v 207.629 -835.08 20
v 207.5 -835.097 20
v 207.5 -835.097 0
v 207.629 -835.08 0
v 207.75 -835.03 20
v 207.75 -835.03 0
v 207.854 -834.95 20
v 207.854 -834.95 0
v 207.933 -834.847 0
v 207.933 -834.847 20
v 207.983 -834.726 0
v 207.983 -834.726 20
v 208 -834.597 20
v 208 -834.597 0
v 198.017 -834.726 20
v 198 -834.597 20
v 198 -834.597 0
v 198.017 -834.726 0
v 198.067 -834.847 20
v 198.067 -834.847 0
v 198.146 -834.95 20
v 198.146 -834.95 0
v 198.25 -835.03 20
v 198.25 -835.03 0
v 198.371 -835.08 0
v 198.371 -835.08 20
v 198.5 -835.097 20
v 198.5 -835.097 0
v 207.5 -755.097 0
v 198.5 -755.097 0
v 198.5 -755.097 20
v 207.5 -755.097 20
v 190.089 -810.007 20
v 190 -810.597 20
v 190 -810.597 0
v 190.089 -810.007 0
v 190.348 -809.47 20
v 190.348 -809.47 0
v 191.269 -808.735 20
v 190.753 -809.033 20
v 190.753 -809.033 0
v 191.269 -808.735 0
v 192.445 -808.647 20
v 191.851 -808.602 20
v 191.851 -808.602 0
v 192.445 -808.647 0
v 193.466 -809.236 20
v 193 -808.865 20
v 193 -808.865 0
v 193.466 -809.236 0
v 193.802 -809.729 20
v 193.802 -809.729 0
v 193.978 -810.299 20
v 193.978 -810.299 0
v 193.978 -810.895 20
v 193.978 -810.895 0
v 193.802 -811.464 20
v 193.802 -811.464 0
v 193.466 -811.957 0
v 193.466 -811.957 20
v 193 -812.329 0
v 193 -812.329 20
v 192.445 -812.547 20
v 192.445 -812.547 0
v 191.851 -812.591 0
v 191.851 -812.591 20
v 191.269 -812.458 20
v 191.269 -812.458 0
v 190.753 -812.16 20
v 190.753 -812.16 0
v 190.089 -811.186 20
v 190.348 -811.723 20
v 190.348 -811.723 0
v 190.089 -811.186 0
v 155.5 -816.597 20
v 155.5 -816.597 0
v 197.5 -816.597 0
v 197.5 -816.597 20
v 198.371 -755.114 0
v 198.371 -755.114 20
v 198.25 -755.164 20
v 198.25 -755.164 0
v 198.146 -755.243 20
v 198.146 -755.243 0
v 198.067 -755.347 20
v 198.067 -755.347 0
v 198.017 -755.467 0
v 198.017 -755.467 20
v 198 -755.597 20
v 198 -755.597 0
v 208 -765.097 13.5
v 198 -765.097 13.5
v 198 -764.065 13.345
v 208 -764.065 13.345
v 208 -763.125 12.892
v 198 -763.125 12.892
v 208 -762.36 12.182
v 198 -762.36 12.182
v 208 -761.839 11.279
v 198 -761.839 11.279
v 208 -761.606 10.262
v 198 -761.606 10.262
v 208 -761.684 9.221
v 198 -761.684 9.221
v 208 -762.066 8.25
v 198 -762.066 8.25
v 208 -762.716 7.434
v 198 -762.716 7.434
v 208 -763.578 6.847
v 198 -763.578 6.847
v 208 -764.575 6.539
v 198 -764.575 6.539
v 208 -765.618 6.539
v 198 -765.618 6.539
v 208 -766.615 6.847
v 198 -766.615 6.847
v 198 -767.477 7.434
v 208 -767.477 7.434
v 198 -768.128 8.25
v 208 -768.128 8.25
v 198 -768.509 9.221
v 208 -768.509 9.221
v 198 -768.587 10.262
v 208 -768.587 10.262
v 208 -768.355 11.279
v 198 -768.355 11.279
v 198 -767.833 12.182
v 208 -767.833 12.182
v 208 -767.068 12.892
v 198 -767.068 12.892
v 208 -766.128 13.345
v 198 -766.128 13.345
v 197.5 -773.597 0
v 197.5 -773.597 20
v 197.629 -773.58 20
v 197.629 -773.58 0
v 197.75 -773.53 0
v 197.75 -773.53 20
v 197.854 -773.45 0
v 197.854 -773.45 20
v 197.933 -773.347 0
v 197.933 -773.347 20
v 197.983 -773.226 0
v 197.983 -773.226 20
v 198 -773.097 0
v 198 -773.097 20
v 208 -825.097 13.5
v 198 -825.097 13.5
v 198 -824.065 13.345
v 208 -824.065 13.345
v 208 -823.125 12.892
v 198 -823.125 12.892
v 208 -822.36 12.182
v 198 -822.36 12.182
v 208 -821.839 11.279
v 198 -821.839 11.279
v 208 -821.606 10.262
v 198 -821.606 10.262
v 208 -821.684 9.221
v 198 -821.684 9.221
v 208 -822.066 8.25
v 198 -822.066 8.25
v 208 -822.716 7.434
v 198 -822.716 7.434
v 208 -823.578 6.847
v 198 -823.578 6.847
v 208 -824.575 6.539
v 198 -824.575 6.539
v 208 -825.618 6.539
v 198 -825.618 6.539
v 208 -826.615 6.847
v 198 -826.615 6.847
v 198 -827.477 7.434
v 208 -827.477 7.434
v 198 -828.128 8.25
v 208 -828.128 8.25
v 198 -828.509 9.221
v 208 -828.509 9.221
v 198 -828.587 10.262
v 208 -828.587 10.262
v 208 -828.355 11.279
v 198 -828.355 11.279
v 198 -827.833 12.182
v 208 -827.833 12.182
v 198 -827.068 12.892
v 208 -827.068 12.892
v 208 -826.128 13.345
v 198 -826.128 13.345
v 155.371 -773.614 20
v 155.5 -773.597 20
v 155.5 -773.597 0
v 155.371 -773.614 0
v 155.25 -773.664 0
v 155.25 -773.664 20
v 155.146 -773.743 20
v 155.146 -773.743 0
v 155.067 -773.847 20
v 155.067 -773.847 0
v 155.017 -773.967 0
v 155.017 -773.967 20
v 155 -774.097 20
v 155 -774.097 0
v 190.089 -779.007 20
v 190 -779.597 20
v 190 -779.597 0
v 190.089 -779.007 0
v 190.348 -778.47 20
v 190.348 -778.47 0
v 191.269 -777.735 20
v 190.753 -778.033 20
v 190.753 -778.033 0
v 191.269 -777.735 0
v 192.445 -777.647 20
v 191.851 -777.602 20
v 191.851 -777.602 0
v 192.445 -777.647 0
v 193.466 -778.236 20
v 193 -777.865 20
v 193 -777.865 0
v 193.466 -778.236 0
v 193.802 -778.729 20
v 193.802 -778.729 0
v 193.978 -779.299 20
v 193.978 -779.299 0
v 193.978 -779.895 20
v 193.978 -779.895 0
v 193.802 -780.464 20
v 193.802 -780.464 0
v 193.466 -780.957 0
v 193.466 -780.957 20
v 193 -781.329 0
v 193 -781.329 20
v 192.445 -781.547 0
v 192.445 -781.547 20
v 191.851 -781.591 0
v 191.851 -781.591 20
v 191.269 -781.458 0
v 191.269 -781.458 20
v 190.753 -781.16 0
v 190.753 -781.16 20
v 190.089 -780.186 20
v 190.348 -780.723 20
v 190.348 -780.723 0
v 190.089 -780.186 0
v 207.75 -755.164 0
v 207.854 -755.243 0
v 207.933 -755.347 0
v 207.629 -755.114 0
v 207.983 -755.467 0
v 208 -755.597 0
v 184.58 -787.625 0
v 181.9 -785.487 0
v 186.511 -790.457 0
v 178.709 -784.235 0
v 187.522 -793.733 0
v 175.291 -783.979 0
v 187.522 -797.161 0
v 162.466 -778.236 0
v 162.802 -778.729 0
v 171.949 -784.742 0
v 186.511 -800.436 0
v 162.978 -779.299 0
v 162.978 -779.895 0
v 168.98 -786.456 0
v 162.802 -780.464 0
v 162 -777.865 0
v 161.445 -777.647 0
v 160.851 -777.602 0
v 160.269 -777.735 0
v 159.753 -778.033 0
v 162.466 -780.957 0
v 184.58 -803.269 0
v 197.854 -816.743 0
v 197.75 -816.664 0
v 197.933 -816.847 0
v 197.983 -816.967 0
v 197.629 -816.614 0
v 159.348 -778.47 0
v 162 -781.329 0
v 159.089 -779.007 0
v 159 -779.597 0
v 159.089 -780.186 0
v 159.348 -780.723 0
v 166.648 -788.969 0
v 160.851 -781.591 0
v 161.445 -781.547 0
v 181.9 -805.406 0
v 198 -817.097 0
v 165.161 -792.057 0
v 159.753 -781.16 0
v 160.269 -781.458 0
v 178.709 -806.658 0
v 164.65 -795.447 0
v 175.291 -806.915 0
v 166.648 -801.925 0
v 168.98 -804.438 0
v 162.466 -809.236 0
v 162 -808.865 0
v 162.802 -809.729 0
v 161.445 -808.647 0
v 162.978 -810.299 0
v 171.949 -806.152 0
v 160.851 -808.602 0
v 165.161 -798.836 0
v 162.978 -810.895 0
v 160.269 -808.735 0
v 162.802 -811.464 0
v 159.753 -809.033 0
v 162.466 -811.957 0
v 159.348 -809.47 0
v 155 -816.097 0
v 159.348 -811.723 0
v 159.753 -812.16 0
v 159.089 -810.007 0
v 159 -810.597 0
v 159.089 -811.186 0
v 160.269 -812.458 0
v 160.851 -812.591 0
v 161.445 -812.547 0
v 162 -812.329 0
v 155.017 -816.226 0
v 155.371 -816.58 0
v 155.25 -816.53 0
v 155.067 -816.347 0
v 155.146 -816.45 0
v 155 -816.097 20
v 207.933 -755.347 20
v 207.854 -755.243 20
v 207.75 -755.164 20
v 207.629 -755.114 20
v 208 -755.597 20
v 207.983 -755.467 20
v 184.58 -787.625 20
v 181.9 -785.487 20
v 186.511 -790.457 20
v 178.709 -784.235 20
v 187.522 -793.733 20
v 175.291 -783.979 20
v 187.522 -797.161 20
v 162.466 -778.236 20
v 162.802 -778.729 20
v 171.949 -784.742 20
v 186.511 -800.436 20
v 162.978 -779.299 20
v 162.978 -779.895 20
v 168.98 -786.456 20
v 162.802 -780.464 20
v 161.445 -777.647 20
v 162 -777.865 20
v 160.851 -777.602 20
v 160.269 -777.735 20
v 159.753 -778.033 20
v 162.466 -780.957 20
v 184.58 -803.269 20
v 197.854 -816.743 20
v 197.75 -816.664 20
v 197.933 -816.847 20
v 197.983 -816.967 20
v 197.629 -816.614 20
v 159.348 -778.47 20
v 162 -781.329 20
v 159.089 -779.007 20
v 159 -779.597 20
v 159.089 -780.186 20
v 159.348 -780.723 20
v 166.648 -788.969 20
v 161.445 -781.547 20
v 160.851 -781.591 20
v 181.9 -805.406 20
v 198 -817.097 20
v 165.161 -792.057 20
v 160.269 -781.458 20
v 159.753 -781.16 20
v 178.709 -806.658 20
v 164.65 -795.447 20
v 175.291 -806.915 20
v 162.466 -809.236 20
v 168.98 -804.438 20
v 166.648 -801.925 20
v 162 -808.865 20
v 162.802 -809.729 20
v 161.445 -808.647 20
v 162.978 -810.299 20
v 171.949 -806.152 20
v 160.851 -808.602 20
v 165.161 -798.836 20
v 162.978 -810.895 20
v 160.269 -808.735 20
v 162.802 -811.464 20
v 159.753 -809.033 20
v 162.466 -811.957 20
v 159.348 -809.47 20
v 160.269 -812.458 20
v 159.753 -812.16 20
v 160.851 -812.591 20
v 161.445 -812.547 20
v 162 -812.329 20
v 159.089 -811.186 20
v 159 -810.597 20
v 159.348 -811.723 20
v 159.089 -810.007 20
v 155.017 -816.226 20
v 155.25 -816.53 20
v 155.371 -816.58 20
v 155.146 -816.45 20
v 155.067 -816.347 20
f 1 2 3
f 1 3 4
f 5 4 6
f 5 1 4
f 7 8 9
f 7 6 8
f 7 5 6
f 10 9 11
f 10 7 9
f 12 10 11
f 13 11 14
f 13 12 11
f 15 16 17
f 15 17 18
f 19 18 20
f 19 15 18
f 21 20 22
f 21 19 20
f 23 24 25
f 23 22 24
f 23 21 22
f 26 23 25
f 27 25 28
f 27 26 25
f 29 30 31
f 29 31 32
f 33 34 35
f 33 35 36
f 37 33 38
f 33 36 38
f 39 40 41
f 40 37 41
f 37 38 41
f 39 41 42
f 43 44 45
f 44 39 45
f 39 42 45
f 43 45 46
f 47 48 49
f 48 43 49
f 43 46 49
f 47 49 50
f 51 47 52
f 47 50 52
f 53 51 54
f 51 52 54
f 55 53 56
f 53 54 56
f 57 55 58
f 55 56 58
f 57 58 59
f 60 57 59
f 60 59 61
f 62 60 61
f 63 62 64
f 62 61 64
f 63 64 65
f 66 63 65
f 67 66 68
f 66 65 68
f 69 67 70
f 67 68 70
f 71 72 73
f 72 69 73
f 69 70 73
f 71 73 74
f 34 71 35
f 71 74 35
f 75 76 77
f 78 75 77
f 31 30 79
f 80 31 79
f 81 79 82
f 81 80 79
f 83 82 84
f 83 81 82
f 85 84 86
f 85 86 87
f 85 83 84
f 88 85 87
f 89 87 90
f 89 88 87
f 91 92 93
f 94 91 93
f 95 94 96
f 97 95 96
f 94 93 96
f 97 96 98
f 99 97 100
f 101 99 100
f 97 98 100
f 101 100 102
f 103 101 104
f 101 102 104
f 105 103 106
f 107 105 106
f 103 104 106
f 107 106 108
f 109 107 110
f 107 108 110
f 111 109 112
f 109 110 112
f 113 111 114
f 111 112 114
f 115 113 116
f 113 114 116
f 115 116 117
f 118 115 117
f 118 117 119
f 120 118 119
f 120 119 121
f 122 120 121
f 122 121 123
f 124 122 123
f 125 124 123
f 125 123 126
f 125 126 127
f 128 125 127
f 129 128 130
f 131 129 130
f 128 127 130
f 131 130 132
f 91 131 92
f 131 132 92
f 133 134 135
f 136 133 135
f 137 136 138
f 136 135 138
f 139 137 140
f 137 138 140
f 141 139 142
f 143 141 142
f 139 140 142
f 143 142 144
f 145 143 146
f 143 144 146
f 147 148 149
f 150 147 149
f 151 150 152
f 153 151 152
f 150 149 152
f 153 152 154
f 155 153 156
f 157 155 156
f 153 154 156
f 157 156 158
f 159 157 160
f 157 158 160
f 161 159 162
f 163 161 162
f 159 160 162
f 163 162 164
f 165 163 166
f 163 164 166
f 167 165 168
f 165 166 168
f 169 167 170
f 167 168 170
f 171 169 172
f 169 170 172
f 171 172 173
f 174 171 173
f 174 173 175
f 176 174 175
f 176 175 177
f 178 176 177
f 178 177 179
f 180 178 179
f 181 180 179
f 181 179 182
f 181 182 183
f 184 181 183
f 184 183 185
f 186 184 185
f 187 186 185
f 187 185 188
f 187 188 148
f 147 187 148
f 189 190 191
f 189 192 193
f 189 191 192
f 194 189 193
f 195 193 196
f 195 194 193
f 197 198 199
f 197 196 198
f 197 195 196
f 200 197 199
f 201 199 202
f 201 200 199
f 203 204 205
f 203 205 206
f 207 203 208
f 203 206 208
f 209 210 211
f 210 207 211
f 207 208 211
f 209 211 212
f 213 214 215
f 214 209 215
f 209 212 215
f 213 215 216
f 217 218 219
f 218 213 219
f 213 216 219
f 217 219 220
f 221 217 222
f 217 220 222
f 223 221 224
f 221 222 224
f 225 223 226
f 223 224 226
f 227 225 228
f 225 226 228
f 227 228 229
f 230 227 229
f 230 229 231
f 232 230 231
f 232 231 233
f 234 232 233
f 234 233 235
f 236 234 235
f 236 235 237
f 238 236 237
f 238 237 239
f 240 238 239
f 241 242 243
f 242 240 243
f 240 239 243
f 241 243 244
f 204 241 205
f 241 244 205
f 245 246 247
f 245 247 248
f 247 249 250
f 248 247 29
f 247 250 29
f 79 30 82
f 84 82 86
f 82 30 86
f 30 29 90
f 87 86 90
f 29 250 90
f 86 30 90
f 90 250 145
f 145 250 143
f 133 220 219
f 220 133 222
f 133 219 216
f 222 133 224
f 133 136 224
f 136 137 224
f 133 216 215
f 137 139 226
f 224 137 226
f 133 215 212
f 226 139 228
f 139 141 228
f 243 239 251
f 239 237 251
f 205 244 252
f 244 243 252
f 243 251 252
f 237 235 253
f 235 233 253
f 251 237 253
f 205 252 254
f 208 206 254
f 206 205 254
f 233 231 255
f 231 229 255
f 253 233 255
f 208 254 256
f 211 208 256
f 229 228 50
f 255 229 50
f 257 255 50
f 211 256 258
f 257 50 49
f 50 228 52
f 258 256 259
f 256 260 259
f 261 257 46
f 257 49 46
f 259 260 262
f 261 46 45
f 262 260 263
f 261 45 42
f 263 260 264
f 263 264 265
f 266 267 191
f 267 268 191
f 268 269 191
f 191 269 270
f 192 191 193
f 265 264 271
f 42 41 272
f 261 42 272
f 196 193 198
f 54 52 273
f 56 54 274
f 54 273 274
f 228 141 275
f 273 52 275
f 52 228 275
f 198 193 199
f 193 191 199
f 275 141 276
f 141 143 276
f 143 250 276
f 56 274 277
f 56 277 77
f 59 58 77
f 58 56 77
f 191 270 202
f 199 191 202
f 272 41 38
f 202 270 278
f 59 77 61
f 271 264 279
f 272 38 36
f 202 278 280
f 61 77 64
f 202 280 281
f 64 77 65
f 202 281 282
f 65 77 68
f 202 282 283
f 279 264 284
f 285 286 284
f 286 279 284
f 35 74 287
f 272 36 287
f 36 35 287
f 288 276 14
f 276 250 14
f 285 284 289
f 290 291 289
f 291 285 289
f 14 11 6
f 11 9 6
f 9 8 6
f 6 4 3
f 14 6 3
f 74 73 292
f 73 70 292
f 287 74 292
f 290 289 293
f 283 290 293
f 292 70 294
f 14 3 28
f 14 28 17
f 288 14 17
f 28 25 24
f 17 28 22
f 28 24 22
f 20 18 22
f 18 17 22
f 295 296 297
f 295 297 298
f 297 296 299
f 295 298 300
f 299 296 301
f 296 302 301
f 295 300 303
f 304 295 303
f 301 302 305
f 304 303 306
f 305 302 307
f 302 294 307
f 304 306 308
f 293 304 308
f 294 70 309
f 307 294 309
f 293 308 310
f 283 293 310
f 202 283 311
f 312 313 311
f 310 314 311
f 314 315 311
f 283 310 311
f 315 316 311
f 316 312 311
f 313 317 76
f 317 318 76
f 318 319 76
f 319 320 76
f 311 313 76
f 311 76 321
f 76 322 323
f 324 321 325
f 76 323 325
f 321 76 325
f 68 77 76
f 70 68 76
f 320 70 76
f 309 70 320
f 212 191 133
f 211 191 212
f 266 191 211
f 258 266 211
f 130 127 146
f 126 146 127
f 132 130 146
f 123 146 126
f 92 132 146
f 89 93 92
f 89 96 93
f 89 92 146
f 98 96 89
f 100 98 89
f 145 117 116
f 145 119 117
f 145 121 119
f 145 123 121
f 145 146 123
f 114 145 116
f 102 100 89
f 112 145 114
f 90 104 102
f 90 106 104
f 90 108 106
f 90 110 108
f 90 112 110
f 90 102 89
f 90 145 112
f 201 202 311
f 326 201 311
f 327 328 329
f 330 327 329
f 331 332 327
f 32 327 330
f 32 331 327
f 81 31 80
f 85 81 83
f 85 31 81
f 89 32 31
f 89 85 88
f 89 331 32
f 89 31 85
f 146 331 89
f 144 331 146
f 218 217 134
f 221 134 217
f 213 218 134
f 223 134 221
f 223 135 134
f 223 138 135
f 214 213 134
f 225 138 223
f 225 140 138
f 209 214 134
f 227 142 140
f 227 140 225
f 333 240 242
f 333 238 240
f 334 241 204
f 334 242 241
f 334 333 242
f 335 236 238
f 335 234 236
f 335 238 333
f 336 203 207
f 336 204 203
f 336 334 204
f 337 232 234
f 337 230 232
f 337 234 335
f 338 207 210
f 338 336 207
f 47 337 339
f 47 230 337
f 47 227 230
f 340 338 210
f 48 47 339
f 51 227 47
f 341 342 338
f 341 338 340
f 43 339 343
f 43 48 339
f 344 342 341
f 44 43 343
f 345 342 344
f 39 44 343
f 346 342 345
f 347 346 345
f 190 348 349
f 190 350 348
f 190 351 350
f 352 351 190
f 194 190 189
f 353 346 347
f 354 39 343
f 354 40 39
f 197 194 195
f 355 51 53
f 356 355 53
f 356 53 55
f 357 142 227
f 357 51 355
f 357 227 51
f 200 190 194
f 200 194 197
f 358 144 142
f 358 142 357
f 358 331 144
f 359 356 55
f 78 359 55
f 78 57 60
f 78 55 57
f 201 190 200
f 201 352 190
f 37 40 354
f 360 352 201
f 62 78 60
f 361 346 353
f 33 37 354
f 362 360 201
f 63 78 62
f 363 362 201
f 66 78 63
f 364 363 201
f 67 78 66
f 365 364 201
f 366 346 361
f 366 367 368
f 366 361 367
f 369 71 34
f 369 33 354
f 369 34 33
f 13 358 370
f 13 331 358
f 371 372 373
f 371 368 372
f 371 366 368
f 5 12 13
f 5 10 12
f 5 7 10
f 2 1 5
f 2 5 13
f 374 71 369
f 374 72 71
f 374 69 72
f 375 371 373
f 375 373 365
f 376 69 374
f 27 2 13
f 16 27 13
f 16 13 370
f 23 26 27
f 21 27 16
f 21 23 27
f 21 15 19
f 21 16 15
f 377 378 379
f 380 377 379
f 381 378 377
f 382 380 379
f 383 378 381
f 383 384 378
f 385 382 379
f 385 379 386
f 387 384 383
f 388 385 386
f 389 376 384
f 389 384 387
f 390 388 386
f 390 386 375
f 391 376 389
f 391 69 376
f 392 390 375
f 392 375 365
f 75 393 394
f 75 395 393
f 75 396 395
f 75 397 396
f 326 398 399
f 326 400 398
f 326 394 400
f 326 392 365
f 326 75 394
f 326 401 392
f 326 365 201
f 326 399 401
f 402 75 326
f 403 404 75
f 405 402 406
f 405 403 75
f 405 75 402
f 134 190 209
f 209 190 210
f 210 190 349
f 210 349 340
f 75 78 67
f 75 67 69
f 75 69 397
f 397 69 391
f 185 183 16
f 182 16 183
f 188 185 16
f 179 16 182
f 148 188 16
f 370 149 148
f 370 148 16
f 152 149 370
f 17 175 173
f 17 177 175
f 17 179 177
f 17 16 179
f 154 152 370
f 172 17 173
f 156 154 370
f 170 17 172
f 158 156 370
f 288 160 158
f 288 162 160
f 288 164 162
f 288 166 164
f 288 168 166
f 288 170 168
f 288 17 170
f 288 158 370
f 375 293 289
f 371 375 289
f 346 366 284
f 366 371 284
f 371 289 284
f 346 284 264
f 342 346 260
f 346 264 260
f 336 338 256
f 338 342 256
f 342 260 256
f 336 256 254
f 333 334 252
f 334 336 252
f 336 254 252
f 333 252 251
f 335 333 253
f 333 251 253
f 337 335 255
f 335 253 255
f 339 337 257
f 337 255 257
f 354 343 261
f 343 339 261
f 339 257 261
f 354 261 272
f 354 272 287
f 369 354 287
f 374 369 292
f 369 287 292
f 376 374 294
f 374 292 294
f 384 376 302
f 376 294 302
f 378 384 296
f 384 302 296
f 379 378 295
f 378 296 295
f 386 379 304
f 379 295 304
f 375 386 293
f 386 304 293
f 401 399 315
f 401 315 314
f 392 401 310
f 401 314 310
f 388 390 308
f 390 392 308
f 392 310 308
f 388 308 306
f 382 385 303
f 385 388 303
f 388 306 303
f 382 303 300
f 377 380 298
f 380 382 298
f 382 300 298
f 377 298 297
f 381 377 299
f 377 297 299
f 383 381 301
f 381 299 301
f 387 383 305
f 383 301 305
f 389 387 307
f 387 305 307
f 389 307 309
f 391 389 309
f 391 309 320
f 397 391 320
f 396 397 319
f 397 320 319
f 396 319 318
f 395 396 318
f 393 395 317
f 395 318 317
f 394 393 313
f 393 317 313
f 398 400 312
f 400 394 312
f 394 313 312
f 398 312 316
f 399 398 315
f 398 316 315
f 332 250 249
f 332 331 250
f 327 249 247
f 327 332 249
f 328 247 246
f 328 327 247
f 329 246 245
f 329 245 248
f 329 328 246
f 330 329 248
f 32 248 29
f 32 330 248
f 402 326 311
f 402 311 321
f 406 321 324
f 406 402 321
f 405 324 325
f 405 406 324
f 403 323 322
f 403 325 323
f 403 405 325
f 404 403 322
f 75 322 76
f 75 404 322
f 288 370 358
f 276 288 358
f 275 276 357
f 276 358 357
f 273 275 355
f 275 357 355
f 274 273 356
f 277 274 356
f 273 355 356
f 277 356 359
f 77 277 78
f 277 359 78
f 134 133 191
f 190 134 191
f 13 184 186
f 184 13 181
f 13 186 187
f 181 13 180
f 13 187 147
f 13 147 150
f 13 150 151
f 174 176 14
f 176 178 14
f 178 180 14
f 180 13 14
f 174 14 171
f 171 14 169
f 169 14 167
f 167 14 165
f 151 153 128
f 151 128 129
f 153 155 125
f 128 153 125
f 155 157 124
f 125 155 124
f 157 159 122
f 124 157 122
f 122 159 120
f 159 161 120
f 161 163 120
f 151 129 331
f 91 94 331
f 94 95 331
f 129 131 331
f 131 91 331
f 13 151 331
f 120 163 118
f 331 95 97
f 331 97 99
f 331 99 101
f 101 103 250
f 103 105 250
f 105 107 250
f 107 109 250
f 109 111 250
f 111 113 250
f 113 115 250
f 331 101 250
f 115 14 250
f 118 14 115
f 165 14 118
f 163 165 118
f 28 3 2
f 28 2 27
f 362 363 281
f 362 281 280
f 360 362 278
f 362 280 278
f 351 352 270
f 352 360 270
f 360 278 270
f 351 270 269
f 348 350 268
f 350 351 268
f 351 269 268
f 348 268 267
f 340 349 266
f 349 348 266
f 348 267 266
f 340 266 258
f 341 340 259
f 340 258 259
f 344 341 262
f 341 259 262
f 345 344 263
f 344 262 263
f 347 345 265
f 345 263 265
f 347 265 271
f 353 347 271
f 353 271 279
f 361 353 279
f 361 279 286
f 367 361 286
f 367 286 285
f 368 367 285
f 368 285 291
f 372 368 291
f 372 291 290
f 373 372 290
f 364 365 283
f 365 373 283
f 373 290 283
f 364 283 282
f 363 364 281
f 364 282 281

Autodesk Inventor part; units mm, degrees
ref_plane "YZ Plane" through (0, 0, 0) normal (1, 0, 0) x (0, 1, 0)
ref_plane "XZ Plane" through (0, 0, 0) normal (0, 1, 0) x (-1, 0, 0)
ref_plane "Work Plane1" through (0, -862.1118, 0) normal (0, 0, 1) x (-1, 0, 0)
sketch "Sketch1" plane through (0, -862.1118, 0) normal (0, 0, 1) x (-1, 0, 0)
  circle A0 centre (-188, -18) radius 4 projected
  line L0 (-220, -478) -> (-220, 22) projected
  line L1 (-220, -478) -> (-208, -478) projected
  line L2 (-208, 22) -> (-208, -478) projected
  line L3 (-220, 22) -> (-208, 22) projected
  line L4 (-208, -27.0151) -> (-198, -27.0151)
  line L5 (-198, -107.0151) -> (-208, -107.0151)
  line L6 (-208, -107.0151) -> (-208, -27.0151)
  line L7 (-155, -45.5151) -> (-198, -45.5151)
  line L8 (-198, -88.5151) -> (-155, -88.5151)
  line L9 (-155, -88.5151) -> (-155, -45.5151)
  circle A1 centre (-176.15, -66.6651) radius 11.5
  circle A2 centre (-161, -51.5151) radius 2
  circle A3 centre (-192, -51.5151) radius 2
  circle A4 centre (-192, -82.5151) radius 2
  circle A5 centre (-161, -82.5151) radius 2
  line L10 (-192, -82.5151) -> (-192, -51.5151) construction
  line L11 (-192, -82.5151) -> (-161, -82.5151) construction
  line L12 (-198, -27.0151) -> (-198, -45.5151)
  line L13 (-198, -88.5151) -> (-198, -107.0151)
  point P0 (0, -862.1118)
  dimension "d0" = 10
  dimension "d1" = 80
  dimension "d3" = 43
  dimension "d4" = 18.5
  dimension "d5" = 18.5
  dimension "d6" = 23
  dimension "d7" = 4
  dimension "d8" = 4
  dimension "d9" = 4
  dimension "d10" = 4
  dimension "d11" = 31
  dimension "d12" = 31
  dimension "d13" = 31
  dimension "d14" = 31
  dimension "d15" = 6
  dimension "d18" = 6
  dimension "d19" = 6
  dimension "d20" = 6
  dimension "d21" = 90
  dimension "d25" = 21.15
  dimension "d26" = 21.15
  dimension "d27" = 90
  dimension "d28" = 90
  dimension "d29" = 18.5
extrude "Tykkelse" add sketch "Sketch1" along normal blind 20 contours L2 L4 L12 L7 L9 L8 L13 L5
sketch "Sketch2" plane through (198, -835.0967, 0) normal (-1, 0, 0) x (0, 0, 1)
  line L0 (0, 0) -> (20, 0) projected
  line L1 (20, 18.5) -> (20, 0) projected
  line L2 (0, 80) -> (0, 61.5) projected
  line L3 (0, 61.5) -> (20, 61.5) projected
  line L4 (20, 80) -> (20, 61.5) projected
  line L5 (0, 80) -> (20, 80) projected
  circle A0 centre (10, 70) radius 3.5
  circle A1 centre (10, 10) radius 3.5
  point P0 (0, 835.0967)
  dimension "d32" = 7
  dimension "d33" = 7
  dimension "d34" = 10
  dimension "d35" = 10
  dimension "d36" = 10
  dimension "d37" = 10
extrude "Extrusion2" cut sketch "Sketch2" against normal up to surface (10 mm away) contours A0 | A1
fillet "Fillet1" radius 0.5 8 edges at (198, -816.5967, 10) (198, -773.5967, 10) (155, -773.5967, 10) (155, -816.5967, 10) (198, -835.0967, 10) (208, -835.0967, 10) (198, -755.0967, 10) (208, -755.0967, 10)
equation "\"d4\" = d5"
equation "\"d8\" = d7"
equation "\"d9\" = d7"
equation "\"d10\" = d7"
equation "\"d13\" = d11"
equation "\"d14\" = d12"
equation "\"d15\" = d20"
equation "\"d18\" = d15"
equation "\"d19\" = d18"
properties part number "Stepper Holder X&Y" material "Aluminum 6061"
